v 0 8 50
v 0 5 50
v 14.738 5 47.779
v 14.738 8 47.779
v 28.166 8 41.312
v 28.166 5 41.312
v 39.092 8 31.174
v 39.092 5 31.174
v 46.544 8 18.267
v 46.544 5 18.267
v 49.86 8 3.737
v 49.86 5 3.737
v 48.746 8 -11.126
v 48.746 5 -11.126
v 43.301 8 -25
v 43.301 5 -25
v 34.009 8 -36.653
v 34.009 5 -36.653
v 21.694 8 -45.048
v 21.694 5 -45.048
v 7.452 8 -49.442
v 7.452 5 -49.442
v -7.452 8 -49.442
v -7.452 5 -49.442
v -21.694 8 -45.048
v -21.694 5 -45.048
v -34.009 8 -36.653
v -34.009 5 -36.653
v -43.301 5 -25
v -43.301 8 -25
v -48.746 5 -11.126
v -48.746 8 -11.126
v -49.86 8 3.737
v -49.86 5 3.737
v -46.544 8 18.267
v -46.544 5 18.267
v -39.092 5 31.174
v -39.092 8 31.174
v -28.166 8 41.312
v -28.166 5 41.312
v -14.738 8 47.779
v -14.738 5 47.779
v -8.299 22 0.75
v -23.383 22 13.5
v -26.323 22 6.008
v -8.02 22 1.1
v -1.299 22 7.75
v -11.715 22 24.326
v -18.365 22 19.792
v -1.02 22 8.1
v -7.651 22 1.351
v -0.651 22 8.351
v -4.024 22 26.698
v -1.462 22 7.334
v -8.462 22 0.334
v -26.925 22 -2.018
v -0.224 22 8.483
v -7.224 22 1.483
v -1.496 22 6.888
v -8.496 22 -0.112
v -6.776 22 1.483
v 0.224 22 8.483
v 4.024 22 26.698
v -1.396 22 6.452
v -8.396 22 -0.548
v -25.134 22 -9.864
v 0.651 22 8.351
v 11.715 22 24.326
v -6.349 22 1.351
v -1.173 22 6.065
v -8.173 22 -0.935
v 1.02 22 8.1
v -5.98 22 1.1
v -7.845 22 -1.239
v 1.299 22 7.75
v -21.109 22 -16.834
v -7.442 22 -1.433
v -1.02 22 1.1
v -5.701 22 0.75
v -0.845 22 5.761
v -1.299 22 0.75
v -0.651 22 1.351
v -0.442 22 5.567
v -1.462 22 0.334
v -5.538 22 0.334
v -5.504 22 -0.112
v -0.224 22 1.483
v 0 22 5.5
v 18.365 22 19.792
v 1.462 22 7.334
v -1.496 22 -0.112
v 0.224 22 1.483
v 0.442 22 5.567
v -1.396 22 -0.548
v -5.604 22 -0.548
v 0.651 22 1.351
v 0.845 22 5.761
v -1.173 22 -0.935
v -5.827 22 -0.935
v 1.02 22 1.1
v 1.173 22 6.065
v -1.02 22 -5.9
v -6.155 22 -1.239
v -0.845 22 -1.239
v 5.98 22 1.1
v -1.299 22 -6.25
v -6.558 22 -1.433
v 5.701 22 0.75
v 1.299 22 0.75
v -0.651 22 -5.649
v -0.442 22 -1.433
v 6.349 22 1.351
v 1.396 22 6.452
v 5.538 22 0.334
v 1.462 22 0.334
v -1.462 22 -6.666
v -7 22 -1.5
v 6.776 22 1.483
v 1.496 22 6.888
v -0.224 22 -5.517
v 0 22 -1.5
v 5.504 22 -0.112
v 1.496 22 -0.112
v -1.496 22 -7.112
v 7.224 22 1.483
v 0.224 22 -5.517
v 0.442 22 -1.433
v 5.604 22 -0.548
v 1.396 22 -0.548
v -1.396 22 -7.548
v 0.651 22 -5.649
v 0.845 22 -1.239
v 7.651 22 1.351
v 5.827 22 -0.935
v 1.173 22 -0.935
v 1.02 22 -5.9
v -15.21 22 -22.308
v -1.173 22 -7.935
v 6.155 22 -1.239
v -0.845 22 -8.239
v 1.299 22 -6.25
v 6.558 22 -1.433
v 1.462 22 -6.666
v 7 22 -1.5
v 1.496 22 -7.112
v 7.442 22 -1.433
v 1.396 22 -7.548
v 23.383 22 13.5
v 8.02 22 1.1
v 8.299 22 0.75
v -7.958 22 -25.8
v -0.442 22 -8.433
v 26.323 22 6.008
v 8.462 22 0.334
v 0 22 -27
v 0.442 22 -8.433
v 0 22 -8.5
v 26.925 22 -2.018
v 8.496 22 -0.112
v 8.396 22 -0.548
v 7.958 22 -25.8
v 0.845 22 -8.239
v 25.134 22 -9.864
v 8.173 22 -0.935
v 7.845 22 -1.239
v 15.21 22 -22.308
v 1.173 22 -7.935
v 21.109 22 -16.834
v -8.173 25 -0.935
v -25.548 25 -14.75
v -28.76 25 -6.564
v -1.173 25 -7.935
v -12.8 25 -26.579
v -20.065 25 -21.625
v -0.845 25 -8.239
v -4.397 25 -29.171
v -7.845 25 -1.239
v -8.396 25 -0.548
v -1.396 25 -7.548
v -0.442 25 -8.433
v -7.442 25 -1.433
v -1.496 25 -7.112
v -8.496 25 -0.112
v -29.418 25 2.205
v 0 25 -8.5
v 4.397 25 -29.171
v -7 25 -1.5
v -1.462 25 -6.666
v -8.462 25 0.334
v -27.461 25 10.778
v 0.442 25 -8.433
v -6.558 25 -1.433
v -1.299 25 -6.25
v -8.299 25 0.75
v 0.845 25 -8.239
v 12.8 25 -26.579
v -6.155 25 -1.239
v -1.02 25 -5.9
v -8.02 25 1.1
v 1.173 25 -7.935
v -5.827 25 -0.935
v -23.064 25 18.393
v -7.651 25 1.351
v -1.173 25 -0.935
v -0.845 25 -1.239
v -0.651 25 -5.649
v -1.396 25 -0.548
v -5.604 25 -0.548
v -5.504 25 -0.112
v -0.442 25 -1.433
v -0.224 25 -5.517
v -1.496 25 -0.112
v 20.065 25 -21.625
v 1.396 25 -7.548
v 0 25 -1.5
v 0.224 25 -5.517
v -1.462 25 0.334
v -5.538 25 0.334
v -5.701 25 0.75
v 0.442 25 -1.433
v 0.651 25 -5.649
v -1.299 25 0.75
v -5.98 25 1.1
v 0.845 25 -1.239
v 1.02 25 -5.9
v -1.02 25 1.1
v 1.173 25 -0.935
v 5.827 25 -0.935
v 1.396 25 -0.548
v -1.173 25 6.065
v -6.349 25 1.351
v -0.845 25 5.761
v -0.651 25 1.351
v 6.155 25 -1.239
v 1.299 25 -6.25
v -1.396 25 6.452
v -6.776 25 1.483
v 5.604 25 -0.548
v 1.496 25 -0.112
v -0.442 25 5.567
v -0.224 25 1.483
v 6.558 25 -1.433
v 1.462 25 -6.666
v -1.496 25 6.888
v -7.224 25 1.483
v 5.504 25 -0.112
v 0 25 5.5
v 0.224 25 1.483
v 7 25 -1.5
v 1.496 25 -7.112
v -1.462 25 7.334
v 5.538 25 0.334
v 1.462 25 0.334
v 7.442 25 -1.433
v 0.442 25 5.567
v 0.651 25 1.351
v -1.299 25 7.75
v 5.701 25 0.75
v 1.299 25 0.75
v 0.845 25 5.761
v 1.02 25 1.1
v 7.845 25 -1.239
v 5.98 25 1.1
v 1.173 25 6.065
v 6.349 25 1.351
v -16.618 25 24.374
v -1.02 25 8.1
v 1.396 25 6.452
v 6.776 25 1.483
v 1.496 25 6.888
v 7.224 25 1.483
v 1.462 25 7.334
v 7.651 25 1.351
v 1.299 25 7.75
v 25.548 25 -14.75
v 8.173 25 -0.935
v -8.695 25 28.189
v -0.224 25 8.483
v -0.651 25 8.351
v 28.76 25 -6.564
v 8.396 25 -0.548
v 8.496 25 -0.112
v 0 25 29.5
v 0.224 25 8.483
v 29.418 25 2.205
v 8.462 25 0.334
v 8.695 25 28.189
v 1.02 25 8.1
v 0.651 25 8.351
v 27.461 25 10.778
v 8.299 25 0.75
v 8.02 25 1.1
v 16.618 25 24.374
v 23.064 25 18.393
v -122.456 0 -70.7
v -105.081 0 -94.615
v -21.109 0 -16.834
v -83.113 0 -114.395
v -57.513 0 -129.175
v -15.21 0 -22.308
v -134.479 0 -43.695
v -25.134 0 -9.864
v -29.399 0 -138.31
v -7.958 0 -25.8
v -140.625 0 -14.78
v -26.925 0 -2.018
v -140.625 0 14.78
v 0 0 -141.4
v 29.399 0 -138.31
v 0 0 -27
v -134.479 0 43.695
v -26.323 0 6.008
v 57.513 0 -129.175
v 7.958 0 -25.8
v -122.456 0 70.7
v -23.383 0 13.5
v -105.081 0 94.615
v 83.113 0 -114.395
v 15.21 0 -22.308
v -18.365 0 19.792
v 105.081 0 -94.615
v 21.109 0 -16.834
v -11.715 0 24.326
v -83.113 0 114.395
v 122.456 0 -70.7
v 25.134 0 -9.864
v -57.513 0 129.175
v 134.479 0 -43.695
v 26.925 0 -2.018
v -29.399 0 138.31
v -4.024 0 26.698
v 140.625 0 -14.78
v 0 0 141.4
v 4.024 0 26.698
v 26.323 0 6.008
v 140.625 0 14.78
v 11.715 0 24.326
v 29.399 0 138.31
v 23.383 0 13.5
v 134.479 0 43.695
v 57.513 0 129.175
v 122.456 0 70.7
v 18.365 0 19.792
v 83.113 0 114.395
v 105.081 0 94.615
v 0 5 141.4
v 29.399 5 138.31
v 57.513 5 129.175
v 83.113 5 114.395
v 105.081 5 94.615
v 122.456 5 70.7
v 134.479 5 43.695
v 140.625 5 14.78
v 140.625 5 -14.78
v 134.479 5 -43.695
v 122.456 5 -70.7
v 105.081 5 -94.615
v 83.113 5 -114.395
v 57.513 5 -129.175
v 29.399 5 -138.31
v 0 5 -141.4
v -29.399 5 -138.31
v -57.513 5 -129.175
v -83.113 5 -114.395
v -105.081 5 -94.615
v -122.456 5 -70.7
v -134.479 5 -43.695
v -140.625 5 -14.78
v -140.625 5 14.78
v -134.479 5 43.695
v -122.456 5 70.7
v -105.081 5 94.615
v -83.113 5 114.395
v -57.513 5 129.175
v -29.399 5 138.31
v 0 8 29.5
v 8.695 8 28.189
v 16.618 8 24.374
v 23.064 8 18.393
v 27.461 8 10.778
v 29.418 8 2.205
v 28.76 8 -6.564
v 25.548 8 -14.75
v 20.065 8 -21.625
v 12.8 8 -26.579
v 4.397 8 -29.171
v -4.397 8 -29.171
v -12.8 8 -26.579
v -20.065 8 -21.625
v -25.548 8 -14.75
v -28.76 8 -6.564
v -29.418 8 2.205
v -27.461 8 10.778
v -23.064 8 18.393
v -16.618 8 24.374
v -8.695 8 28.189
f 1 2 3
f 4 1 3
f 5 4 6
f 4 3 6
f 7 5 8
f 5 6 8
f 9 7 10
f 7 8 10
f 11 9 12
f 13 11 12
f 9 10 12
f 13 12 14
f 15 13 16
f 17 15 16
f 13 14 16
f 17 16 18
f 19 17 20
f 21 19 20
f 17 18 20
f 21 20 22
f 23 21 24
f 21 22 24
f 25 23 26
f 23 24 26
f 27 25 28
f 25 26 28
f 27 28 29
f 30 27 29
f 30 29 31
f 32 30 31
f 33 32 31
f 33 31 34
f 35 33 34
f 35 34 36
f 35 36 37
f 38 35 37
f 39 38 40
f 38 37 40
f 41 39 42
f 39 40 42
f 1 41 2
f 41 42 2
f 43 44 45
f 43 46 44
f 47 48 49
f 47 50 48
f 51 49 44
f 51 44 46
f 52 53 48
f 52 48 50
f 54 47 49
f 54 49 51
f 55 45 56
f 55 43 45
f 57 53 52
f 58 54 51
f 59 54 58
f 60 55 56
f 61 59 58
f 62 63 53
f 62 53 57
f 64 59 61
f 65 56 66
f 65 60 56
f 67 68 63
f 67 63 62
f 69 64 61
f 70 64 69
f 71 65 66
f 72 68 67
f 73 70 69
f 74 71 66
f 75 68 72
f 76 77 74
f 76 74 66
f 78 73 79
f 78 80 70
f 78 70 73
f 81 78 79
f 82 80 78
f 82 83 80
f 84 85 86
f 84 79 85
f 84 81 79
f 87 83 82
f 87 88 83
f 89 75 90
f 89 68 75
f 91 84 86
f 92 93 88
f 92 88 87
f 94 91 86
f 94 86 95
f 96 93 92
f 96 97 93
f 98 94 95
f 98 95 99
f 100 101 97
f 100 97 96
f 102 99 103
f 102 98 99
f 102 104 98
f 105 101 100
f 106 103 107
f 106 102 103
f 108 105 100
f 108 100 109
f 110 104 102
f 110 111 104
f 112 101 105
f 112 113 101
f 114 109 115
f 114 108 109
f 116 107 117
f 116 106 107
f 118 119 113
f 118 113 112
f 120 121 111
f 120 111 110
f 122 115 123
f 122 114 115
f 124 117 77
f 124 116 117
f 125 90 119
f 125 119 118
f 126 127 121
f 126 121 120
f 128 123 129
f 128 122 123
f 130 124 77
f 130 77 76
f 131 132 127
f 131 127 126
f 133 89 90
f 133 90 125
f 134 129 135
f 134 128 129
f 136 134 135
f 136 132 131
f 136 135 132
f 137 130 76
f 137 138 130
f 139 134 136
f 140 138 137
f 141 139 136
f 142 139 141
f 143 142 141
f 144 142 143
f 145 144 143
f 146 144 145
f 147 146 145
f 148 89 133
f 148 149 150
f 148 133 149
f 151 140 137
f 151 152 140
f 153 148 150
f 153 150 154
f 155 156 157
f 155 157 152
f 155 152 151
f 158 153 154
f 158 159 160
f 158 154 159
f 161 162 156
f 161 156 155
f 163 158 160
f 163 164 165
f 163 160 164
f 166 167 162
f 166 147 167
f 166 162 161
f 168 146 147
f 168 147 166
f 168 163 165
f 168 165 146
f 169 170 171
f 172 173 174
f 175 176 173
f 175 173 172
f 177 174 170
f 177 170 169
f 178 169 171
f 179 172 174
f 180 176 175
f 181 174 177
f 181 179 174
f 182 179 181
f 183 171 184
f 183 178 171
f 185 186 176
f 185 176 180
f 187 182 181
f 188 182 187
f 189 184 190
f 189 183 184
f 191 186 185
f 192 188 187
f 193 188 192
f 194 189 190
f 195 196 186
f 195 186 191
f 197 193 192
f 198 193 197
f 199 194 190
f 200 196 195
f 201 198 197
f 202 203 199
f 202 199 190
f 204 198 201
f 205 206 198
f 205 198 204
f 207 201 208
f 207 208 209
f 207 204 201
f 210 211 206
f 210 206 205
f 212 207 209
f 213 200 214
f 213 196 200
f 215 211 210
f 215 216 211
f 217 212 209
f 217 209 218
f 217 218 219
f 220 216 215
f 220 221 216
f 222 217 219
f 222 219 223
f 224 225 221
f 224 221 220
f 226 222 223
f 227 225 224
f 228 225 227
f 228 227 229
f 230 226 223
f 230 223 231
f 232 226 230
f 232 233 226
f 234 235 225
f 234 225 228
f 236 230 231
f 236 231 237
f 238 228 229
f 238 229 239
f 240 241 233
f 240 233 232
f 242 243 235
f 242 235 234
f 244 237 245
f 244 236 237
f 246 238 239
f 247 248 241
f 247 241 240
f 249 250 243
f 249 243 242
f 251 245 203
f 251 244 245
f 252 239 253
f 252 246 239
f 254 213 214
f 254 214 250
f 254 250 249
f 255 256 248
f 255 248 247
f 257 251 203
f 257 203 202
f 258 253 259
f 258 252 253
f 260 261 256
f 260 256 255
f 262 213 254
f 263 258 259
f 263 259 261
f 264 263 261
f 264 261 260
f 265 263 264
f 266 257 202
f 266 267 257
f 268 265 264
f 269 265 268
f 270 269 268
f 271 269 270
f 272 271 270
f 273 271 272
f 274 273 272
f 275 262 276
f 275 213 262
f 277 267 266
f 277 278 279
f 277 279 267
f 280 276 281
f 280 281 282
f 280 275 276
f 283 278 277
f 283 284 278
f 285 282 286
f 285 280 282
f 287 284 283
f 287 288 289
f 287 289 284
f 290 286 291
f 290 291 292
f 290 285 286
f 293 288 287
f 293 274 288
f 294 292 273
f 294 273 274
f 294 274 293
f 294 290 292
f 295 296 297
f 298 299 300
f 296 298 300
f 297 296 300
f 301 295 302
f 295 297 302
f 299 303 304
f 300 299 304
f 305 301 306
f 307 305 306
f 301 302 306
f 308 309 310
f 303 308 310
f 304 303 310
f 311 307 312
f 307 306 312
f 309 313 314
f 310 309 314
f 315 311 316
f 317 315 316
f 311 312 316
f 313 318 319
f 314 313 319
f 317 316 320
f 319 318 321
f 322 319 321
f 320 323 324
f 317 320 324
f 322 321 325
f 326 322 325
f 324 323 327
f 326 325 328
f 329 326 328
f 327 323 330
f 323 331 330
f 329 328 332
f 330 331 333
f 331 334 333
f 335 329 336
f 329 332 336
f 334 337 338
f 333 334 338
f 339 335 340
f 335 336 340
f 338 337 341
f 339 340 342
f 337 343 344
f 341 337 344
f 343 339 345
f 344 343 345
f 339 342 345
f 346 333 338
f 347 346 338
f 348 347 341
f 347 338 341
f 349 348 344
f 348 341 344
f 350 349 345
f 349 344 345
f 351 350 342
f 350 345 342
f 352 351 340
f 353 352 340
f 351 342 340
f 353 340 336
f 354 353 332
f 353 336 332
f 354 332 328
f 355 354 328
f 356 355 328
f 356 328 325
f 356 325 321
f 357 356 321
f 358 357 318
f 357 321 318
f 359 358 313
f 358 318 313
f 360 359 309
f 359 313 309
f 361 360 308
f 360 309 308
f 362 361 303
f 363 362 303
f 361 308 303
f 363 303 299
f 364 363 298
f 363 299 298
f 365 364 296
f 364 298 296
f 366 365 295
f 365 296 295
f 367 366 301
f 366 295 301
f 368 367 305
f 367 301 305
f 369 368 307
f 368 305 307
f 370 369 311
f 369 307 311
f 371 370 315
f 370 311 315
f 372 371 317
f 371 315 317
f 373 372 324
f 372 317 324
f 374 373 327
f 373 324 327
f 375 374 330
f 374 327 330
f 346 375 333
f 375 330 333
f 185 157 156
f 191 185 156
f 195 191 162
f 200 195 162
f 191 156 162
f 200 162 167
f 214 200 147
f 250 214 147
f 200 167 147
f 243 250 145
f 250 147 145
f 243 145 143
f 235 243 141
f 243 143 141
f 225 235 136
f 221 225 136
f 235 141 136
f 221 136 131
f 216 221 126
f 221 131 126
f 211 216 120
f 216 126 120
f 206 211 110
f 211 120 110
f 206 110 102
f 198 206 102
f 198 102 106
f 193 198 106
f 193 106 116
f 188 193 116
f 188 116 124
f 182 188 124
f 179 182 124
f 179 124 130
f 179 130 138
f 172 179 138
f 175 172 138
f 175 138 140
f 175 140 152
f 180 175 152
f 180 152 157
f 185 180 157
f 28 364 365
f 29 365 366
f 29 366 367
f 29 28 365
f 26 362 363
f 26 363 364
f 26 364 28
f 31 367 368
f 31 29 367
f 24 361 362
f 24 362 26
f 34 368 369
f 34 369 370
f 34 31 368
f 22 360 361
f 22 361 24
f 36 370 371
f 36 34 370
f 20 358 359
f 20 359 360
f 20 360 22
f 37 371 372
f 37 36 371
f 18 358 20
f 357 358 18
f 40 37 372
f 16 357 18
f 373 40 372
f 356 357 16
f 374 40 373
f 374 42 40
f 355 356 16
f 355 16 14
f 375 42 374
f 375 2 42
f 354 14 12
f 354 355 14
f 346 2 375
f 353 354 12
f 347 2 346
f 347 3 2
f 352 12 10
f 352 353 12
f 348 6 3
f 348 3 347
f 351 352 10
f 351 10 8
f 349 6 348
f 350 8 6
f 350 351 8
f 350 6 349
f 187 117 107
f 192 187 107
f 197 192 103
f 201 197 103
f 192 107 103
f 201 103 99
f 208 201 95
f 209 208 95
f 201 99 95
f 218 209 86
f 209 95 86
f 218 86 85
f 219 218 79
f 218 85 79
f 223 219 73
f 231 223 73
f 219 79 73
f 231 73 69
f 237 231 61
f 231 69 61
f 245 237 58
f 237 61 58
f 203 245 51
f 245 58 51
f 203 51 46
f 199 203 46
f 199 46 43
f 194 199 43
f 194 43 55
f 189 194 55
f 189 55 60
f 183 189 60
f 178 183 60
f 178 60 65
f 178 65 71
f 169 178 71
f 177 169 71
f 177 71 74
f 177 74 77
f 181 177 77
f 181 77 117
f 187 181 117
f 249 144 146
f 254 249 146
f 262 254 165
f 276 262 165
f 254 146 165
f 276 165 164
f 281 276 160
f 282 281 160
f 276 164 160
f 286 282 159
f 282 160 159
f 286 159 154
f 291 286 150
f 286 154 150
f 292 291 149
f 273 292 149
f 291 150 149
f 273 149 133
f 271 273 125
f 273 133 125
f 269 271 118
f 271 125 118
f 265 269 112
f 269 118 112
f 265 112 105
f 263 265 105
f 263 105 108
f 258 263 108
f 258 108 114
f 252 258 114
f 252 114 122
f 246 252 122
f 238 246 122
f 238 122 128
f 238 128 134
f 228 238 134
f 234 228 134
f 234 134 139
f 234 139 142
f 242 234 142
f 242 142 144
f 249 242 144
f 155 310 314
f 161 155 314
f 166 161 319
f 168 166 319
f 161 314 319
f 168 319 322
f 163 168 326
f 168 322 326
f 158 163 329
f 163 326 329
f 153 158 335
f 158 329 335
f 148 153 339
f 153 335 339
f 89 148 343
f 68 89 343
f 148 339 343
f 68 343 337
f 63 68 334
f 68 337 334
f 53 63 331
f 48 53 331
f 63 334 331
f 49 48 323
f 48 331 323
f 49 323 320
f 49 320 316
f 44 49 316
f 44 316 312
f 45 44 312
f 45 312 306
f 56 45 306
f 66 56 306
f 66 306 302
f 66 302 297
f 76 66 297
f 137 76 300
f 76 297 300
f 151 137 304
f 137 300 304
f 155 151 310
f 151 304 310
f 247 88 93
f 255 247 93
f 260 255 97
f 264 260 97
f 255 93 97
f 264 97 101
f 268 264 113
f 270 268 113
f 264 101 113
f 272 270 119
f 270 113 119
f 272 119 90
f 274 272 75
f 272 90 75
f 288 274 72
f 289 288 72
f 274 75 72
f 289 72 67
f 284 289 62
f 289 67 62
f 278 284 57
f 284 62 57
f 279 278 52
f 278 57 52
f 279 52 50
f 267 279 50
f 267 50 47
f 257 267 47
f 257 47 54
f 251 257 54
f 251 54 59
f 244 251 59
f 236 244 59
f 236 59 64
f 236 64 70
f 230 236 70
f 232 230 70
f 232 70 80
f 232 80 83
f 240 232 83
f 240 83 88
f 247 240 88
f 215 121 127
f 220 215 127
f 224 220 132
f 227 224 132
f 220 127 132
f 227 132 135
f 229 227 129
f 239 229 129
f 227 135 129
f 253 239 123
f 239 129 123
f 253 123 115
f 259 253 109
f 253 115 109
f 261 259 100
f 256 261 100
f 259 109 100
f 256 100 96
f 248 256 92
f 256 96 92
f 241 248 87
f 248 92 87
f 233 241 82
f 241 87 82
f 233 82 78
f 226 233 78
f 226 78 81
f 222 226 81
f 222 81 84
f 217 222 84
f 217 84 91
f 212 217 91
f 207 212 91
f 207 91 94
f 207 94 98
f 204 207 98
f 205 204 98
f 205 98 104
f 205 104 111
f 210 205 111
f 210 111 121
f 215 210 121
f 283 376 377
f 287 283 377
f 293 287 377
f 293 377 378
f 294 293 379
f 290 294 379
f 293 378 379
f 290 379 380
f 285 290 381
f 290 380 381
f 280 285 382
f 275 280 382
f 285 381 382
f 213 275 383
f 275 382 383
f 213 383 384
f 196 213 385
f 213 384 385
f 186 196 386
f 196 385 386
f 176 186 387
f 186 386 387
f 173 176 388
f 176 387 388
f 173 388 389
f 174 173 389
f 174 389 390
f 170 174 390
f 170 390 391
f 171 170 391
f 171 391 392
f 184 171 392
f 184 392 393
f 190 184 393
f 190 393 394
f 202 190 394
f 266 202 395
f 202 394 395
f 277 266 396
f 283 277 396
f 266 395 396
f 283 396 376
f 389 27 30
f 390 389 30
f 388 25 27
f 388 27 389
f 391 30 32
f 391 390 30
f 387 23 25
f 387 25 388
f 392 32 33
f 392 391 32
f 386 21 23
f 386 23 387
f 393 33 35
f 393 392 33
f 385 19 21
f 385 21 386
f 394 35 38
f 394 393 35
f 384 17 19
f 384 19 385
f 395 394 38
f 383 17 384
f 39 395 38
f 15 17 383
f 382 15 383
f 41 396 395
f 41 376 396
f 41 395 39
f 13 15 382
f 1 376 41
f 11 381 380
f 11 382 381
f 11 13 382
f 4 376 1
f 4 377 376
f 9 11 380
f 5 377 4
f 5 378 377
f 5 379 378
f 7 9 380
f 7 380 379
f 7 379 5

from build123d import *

# Parameters (mm, degrees)
SKETCH_1_R          = 141.4
EXTRUDE_1_DEPTH     = 5
SKETCH_2_R          = 50
EXTRUDE_2_DEPTH     = 3
SKETCH_3_R          = 29.5
EXTRUDE_3_DEPTH     = 17
SKETCH_4_R          = 27
CUT_EXTRUDE_1_DEPTH = 22
SKETCH_5_R          = 1.5
CUT_EXTRUDE_2_DEPTH = 202.176340557


with BuildPart() as part:
    # 草图1 → 凸台-拉伸1 (new body)
    with BuildSketch(Plane(origin=(0, 0, 0), x_dir=(1, 0, 0), z_dir=(0, 1, 0))):
        with Locations(Location((0, 0, 0), (0, 0, 270))):
            Circle(SKETCH_1_R)
    extrude(amount=EXTRUDE_1_DEPTH)

    # 草图2 → 凸台-拉伸2 (add)
    with BuildSketch(Plane(origin=(0, 5, 0), x_dir=(1, 0, 0), z_dir=(0, 1, 0))):
        with Locations(Location((0, 0, 0), (0, 0, 270))):
            Circle(SKETCH_2_R)
    extrude(amount=EXTRUDE_2_DEPTH)

    # 草图3 → 凸台-拉伸3 (add)
    with BuildSketch(Plane(origin=(0, 8, 0), x_dir=(1, 0, 0), z_dir=(0, 1, 0))):
        with Locations(Location((0, 0, 0), (0, 0, 270))):
            Circle(SKETCH_3_R)
    extrude(amount=EXTRUDE_3_DEPTH)

    # 草图4 → 切除-拉伸1 (cut)
    with BuildSketch(Plane.XZ):
        with Locations(Location((0, 0, 0), (0, 0, 270))):
            Circle(SKETCH_4_R)
    extrude(amount=-CUT_EXTRUDE_1_DEPTH, mode=Mode.SUBTRACT)

    # 草图5 → 切除-拉伸2 (cut, through all)
    with BuildSketch(Plane.XZ.offset(-22)):
        with Locations(Location((0, 0, 0), (0, 0, 270))):
            Circle(SKETCH_5_R)
        with Locations(Location((0, 7, 0), (0, 0, 270))):
            Circle(SKETCH_5_R)
        with Locations(Location((7, 0, 0), (0, 0, 270))):
            Circle(SKETCH_5_R)
        with Locations(Location((0, -7, 0), (0, 0, 270))):
            Circle(SKETCH_5_R)
        with Locations(Location((-7, 0, 0), (0, 0, 270))):
            Circle(SKETCH_5_R)
    extrude(amount=-CUT_EXTRUDE_2_DEPTH, mode=Mode.SUBTRACT)


solid = part.part
